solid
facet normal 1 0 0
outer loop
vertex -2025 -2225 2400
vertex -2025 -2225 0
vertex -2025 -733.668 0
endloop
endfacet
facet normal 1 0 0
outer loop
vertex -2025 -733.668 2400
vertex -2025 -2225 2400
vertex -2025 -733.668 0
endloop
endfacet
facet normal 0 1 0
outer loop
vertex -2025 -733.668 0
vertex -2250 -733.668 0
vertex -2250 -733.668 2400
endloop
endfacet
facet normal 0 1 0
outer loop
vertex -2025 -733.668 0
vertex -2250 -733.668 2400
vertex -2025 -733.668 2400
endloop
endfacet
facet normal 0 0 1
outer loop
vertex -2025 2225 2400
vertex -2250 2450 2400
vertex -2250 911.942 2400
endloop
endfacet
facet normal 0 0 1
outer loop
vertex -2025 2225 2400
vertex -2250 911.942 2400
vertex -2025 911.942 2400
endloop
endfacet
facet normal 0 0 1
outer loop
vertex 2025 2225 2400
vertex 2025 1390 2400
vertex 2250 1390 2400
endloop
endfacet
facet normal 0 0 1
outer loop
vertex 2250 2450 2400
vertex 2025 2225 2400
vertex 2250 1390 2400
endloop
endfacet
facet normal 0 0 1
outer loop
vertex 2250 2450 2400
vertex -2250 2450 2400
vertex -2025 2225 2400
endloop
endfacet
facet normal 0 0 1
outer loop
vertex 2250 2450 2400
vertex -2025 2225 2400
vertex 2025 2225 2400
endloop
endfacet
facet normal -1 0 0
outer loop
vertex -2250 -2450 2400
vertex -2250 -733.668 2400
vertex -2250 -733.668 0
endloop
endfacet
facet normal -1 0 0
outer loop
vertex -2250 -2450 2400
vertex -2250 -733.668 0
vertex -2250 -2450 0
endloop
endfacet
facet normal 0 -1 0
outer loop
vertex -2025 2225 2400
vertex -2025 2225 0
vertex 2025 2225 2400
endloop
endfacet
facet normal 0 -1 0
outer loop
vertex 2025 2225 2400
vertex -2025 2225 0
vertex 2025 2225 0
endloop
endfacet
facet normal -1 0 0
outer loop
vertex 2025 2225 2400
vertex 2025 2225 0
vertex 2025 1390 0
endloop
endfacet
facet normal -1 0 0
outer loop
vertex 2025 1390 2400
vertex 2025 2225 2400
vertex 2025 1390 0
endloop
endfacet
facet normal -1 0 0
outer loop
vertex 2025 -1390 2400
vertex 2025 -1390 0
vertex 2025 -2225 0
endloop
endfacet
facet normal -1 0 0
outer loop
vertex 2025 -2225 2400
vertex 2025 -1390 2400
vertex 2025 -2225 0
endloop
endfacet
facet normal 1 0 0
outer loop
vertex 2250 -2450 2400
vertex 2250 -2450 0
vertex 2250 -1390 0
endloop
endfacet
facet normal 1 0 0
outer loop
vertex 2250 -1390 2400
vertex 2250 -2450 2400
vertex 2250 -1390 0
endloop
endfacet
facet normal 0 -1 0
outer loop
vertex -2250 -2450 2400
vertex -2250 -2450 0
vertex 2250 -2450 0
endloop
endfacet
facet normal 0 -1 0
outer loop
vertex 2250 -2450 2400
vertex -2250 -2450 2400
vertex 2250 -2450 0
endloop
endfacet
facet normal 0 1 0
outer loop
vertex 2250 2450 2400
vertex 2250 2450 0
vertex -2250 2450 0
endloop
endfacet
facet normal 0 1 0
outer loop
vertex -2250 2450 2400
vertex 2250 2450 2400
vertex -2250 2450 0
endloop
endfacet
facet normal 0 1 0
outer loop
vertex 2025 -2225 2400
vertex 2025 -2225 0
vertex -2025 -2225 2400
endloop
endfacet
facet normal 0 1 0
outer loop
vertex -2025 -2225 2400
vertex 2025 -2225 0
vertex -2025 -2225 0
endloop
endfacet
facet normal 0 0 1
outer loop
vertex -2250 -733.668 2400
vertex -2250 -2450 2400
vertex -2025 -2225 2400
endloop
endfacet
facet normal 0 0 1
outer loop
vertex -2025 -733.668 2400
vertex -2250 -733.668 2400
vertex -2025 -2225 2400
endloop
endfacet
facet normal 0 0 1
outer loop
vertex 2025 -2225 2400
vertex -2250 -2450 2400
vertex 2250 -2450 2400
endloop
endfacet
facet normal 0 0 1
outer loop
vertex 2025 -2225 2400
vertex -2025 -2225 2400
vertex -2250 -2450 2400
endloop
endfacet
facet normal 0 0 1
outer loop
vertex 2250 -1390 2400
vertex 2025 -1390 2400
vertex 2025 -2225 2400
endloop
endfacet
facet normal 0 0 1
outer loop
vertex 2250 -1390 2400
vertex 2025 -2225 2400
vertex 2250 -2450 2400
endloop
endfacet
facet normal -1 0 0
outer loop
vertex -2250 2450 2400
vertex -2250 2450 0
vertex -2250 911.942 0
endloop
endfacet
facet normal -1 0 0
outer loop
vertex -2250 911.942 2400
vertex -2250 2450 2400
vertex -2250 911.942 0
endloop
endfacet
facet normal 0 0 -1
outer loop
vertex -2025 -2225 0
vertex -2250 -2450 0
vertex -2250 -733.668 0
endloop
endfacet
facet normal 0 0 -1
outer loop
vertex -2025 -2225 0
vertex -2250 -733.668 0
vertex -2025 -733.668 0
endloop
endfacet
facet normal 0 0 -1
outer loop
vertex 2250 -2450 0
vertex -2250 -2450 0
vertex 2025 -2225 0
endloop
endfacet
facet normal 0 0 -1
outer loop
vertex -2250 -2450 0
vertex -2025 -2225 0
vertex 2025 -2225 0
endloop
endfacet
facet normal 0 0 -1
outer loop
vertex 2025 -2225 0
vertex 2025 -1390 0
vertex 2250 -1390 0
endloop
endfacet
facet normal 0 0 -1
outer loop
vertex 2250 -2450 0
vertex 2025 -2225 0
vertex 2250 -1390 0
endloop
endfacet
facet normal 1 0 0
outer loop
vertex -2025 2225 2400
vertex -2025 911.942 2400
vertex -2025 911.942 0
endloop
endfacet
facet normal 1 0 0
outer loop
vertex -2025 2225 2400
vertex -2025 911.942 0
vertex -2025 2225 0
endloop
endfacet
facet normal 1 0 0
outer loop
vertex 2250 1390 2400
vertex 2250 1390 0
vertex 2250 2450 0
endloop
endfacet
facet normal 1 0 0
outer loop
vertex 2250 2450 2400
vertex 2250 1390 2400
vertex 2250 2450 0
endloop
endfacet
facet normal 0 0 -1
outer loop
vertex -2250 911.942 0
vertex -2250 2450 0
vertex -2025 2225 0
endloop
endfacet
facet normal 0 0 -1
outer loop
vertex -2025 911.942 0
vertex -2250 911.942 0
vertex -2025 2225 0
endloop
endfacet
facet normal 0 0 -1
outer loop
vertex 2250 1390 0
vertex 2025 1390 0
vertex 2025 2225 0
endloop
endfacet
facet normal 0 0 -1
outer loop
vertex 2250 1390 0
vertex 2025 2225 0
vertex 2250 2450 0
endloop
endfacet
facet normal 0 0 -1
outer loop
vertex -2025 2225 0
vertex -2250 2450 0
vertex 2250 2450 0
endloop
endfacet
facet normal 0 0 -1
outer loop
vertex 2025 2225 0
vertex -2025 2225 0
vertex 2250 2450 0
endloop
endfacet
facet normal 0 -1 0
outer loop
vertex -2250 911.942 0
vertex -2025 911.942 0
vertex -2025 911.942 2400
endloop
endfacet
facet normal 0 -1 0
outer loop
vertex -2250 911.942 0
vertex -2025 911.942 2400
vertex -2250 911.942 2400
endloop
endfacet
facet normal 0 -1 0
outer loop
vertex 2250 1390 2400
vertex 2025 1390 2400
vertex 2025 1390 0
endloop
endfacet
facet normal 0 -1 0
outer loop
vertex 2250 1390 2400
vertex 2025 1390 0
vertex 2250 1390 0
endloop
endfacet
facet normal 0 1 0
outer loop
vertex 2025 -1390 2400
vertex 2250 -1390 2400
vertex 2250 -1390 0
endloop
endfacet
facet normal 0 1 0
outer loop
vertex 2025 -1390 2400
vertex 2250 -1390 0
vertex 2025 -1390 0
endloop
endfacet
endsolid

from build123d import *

# Parameters (mm, degrees)
F1_DEPTH = 2400
F4_W     = 1023.9203214645
F4_H     = 1645.610332489
F4_W_2   = 1541.7606830597
F4_W_3   = 225
F5_DEPTH = 2400.001


with BuildPart() as f1:
    # F0 (on Top) → F1 (new body)
    with BuildSketch(Plane.XY):
        Polygon((-2250, -2450), (2250, -2450), (2250, -1390), (2025, -1390), (2025, -2225), (-2025, -2225), (-2025, 2225), (2025, 2225), (2025, 1390), (2250, 1390), (2250, 2450), (-2250, 2450), align=None)
    extrude(amount=F1_DEPTH)

    # F4 (on face) → F5 (cut, through all)
    with BuildSketch(Plane.XY.offset(2400)):
        with Locations((-1513.0398392677, 89.1372561455)):
            Rectangle(F4_W, F4_H)
        with Locations((-3020.8803415298, 89.1372561455)):
            Rectangle(F4_W_2, F4_H)
        with Locations((-2137.5, 89.1372561455)):
            Rectangle(F4_W_3, F4_H)
    extrude(amount=-F5_DEPTH, mode=Mode.SUBTRACT)


solid = f1.part
